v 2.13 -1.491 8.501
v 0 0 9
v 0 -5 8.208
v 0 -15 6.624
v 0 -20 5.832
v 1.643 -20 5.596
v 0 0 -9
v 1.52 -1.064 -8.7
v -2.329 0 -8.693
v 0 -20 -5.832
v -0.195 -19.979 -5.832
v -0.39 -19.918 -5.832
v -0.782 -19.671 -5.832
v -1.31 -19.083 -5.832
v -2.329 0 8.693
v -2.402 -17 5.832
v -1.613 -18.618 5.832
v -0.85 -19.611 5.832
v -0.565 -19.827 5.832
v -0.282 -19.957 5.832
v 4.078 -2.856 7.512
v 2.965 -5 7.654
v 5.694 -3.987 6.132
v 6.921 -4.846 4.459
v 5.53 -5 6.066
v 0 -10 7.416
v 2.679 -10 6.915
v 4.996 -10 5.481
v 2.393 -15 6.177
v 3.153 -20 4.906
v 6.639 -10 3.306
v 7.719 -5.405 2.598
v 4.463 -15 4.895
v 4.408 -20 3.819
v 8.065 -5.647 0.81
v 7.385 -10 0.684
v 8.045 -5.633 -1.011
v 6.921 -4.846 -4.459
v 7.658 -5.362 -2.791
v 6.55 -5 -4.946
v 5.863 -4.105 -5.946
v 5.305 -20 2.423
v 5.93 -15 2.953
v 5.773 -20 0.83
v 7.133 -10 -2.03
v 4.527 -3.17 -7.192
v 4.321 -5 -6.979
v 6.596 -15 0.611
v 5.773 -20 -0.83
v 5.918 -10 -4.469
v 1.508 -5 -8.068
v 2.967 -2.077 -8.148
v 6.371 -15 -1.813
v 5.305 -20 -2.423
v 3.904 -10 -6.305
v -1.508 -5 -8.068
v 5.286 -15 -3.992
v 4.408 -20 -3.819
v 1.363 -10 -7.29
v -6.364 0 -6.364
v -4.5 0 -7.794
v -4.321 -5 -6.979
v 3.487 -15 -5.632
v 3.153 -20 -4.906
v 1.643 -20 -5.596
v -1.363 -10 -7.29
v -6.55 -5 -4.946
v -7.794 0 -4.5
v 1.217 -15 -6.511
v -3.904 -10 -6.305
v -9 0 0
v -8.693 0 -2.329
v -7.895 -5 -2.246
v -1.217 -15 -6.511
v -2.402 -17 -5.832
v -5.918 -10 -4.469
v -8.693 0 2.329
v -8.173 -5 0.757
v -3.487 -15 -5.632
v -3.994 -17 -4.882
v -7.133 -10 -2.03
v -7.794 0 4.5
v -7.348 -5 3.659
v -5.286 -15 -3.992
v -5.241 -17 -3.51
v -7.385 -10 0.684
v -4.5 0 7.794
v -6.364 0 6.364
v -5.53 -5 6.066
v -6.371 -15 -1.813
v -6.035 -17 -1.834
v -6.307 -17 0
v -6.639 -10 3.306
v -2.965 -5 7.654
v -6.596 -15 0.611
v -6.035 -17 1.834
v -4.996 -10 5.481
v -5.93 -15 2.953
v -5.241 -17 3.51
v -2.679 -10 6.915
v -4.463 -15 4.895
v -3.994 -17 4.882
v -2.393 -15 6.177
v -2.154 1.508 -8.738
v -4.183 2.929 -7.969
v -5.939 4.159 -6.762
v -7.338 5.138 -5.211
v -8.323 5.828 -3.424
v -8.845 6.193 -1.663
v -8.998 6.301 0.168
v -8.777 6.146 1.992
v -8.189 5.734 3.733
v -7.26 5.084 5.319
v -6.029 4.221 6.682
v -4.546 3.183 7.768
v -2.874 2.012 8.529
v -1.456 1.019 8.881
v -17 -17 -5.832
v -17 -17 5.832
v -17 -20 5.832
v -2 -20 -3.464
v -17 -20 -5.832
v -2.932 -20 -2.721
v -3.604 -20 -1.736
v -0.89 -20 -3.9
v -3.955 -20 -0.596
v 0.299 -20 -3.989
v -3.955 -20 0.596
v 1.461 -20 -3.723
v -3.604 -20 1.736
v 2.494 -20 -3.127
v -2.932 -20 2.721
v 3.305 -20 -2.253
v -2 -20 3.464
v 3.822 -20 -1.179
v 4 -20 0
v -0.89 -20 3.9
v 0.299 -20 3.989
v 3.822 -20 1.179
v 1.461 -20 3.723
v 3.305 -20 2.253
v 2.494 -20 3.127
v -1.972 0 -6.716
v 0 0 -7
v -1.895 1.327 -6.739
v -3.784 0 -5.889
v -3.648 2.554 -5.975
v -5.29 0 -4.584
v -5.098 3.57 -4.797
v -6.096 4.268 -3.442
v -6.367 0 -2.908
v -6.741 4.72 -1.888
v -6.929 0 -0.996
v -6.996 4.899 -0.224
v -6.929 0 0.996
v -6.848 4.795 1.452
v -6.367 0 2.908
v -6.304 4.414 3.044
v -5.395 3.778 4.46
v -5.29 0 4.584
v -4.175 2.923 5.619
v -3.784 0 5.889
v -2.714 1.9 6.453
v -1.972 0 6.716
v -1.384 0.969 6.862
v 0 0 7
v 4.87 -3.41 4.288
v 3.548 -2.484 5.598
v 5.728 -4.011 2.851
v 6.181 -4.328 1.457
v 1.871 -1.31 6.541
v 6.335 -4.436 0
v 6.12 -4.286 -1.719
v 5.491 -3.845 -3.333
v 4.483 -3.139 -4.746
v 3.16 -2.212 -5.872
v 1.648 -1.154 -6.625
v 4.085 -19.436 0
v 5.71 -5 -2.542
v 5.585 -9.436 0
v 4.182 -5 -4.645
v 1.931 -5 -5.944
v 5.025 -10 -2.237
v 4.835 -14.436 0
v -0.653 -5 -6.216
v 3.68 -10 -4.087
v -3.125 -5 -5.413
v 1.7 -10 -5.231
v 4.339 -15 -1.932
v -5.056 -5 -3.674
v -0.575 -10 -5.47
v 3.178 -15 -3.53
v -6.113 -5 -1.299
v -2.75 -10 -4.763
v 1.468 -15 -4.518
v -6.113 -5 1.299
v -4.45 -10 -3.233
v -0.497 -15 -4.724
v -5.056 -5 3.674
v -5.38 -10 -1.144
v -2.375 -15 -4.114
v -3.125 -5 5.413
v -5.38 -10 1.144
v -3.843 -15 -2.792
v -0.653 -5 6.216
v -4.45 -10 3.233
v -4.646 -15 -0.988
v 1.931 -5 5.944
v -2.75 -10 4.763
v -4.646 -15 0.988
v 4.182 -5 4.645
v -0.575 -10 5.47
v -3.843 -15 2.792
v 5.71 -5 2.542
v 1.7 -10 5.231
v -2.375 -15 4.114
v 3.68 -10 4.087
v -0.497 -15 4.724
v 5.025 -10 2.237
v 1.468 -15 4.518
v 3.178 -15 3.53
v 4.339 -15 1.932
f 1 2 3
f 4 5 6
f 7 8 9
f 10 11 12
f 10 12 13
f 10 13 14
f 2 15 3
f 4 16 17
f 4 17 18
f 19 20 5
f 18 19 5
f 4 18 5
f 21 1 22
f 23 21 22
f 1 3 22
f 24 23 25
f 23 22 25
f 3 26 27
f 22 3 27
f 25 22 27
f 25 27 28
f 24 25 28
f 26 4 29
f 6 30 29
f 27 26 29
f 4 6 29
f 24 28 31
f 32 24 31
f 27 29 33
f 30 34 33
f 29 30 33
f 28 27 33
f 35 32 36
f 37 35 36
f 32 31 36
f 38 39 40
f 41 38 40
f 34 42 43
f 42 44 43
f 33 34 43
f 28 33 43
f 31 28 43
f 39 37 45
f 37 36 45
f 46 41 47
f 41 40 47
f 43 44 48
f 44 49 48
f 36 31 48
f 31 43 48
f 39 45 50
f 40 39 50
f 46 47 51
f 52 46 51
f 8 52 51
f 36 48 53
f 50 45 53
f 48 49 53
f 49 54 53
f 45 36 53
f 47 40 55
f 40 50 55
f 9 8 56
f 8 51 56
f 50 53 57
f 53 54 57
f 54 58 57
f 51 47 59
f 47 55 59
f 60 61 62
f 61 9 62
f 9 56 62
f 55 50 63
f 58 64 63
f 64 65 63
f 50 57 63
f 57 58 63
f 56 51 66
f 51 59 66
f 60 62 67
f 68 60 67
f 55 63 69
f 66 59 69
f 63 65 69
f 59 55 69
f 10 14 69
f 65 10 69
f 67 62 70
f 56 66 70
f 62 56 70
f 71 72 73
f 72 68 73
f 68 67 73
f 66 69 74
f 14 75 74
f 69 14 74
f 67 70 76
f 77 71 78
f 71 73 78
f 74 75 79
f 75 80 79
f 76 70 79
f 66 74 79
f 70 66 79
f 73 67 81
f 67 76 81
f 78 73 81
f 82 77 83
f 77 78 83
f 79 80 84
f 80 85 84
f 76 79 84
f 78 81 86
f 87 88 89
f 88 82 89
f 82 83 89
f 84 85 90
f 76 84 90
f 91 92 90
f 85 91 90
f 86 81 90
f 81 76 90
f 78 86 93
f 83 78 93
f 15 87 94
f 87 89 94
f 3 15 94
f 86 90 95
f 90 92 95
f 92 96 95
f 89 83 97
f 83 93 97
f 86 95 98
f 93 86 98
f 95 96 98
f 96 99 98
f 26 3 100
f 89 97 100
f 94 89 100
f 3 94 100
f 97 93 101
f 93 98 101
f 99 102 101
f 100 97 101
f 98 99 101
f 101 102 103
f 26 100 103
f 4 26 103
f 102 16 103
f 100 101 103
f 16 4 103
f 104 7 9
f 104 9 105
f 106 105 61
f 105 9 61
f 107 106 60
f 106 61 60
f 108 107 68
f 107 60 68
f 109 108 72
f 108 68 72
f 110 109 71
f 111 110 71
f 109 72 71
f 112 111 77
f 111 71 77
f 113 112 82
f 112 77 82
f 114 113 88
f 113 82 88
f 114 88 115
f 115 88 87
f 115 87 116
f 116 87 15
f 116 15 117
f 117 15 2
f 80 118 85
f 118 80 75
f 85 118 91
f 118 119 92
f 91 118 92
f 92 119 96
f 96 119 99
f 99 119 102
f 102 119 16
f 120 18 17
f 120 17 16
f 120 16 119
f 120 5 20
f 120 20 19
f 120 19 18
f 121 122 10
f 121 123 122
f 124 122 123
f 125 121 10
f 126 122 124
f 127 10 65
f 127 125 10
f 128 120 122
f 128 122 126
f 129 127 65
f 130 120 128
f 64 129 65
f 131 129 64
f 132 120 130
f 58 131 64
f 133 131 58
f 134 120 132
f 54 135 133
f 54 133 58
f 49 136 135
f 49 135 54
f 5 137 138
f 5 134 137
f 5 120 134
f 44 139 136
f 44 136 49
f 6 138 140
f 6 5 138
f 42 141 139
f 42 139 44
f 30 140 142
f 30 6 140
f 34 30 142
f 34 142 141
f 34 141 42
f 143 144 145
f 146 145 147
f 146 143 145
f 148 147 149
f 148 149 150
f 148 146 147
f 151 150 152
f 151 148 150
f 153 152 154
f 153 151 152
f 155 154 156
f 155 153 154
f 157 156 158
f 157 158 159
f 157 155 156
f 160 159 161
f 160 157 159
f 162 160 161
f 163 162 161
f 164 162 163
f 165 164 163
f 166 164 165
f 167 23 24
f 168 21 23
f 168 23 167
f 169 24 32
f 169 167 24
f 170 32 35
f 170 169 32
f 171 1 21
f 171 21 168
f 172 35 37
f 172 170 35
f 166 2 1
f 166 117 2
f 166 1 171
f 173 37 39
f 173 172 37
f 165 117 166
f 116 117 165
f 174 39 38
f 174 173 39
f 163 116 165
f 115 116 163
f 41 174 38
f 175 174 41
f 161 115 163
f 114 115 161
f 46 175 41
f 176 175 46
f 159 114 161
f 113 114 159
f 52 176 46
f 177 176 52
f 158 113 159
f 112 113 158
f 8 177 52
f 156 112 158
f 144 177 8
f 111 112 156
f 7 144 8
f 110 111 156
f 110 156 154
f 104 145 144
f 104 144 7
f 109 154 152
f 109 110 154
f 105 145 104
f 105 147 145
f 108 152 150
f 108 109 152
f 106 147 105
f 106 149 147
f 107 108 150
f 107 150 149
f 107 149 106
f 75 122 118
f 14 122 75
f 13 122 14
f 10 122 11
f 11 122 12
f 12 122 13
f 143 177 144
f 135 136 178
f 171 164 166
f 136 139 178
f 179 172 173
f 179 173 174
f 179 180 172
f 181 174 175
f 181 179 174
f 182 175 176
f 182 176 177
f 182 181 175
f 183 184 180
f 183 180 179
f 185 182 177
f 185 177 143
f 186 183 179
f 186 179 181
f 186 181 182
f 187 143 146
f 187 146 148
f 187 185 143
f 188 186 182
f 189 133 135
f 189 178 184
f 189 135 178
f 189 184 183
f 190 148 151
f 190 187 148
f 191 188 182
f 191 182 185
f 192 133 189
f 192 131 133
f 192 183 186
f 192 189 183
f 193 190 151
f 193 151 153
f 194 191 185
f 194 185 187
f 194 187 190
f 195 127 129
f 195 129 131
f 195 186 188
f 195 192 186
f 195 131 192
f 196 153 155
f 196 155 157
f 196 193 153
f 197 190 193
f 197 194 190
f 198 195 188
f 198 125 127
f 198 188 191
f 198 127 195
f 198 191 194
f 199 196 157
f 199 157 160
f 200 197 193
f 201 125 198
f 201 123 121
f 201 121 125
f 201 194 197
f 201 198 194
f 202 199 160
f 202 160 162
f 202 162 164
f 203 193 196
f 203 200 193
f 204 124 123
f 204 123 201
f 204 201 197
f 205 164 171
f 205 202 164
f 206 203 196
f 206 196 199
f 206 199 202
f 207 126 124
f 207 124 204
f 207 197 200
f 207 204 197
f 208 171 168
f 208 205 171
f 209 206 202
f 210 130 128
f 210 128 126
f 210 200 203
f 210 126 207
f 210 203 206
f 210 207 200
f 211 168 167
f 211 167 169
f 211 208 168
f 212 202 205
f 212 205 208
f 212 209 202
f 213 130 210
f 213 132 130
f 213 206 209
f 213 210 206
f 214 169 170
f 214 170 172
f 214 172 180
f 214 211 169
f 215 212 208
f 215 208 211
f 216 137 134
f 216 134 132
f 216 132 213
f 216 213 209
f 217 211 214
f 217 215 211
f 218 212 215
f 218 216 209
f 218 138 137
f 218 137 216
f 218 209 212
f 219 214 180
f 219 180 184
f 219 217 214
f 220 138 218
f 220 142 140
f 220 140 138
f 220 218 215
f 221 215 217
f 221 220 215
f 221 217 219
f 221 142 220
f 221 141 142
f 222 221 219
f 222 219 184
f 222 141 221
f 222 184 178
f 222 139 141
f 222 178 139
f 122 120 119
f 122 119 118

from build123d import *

# Parameters (mm, degrees)
SKETCH1_R                     = 9
BOSS_EXTRUDE1_DEPTH           = 20
BOSS_EXTRUDE1_TAPER           = 9
BOSS_EXTRUDE1_OTHER_WAY_DEPTH = 30
SKETCH1_4_R                   = 7
SKETCH2_R                     = 4
SKETCH1_5_R                   = 7
CUT_EXTRUDE1_DEPTH            = 5
BOSS_EXTRUDE3_DEPTH           = 3


with BuildPart() as part:
    # Sketch1 → Boss-Extrude1 (new body)
    with BuildSketch(Plane(origin=(0, 0, 0), x_dir=(1, 0, 0), z_dir=(0, 1, 0))):
        with Locations(Location((0, 0, 0), (0, 0, 270))):
            Circle(SKETCH1_R)
    extrude(amount=-BOSS_EXTRUDE1_DEPTH, taper=BOSS_EXTRUDE1_TAPER)

    # Sketch1 → Boss-Extrude1 other way (add)
    with BuildSketch(Plane(origin=(0, 0, 0), x_dir=(1, 0, 0), z_dir=(0, 1, 0))):
        with Locations(Location((0, 0, 0), (0, 0, 270))):
            Circle(SKETCH1_R)
    extrude(amount=BOSS_EXTRUDE1_OTHER_WAY_DEPTH)

    # SurfaceCut1
    split(bisect_by=Plane(origin=(0, 0, 0), x_dir=(0, 0, -1), z_dir=(0.5735764363510473, 0.819152044288991, -1.9675099965776456e-15)), keep=Keep.BOTTOM)

    # Sketch1<4> → Cut-Loft1 section 0
    with BuildSketch(Plane(origin=(0, 0, 0), x_dir=(1, 0, 0), z_dir=(0, 1, 0))):
        Circle(SKETCH1_4_R)
    # Sketch2 → Cut-Loft1 section 1
    with BuildSketch(Plane.XZ.offset(20)):
        Circle(SKETCH2_R)
    loft(mode=Mode.SUBTRACT)

    # Sketch1<5> → Cut-Extrude1 (cut)
    with BuildSketch(Plane(origin=(0, 0, 0), x_dir=(1, 0, 0), z_dir=(0, 1, 0))):
        Circle(SKETCH1_5_R)
    extrude(amount=CUT_EXTRUDE1_DEPTH, mode=Mode.SUBTRACT)

    # Sketch3 → Boss-Extrude3 (add)
    with BuildSketch(Plane.XZ.offset(20)):
        with BuildLine():
            ThreePointArc((0, -5.832311194), (-5.832311194, 0), (0, 5.832311194))
            Line((0, 5.832311194), (-17, 5.832311194))
            Line((-17, 5.832311194), (-17, -5.832311194))
            Line((-17, -5.832311194), (0, -5.832311194))
        make_face()
    extrude(amount=-BOSS_EXTRUDE3_DEPTH)


solid = part.part
